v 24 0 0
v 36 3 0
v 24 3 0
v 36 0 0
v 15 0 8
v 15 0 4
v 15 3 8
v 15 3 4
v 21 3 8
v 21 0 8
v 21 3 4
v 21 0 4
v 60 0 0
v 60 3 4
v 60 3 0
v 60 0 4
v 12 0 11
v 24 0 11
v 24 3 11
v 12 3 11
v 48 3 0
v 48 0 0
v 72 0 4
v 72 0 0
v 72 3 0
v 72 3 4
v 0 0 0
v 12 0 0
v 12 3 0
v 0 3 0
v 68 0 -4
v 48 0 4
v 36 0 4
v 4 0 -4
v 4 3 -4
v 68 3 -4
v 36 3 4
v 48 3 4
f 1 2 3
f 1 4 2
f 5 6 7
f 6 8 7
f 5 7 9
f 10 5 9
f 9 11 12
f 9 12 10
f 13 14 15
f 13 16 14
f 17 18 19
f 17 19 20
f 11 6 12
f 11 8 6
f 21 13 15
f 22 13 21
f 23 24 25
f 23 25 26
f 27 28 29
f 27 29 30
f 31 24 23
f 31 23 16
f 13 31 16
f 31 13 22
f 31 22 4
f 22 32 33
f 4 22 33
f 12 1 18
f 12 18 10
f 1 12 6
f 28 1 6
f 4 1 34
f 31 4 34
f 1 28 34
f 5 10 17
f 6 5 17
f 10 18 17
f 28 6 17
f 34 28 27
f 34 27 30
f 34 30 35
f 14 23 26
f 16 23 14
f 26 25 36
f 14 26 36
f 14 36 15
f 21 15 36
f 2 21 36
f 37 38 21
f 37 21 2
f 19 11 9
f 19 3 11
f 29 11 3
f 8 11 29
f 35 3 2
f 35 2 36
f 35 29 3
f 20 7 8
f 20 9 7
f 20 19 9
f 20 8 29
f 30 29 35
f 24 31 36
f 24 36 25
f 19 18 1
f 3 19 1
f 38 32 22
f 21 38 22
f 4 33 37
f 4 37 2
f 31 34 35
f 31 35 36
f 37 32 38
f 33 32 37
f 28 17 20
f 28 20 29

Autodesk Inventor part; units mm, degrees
ref_plane "YZ Plane" through (0, 0, 0) normal (1, 0, 0) x (0, 1, 0)
ref_plane "XZ Plane" through (0, 0, 0) normal (0, 1, 0) x (-1, 0, 0)
ref_plane "XY Plane" through (0, 0, 0) normal (0, 0, 1) x (1, 0, 0)
sketch "Эскиз1" plane through (0, 0, 0) normal (0, 1, 0) x (-1, 0, 0)
  line L0 (-4, -4) -> (-68, -4)
  line L1 (-72, 0) -> (-72, 4)
  line L2 (0, 0) -> (-3.643, -3.643)
  line L3 (-3.643, -3.643) -> (-4, -4)
  line L4 (-48, 4) -> (-48, 0)
  line L5 (-48, 4) -> (-48, 0)
  line L6 (-36, 4) -> (-36, 0)
  line L7 (-60, 4) -> (-60, 0)
  line L8 (-72, 4) -> (-60, 4)
  line L9 (-48, 4) -> (-36, 4)
  line L10 (-60, 0) -> (-48, 0)
  line L11 (-36, 0) -> (-24, 0)
  line L12 (-12, 0) -> (0, 0)
  line L13 (-68, -4) -> (-72, 0)
  line L14 (-24, 11) -> (-12, 11)
  line L15 (-12, 11) -> (-12, 0)
  line L16 (-24, 11) -> (-24, 0)
  point P0 (0, 0)
  point P1 (-48, 2)
  point P2 (-72, 2)
  point P3 (-48, 2)
  point P4 (-12, 2)
  point P5 (-36, 2)
  point P6 (-60, 2)
  point P7 (-30, 0)
  point P8 (-3.8215, -3.8215)
  dimension "d9" = 24
  dimension "d13" = 12
  dimension "d19" = 4
  dimension "d23" = 8
  dimension "d26" = 135
  dimension "d28" = 72
  dimension "d29" = 12
  dimension "d30" = 11
extrude "Выдавливание1" add sketch "Эскиз1" along normal blind 3
sketch "Эскиз2" plane through (0, 3, 0) normal (0, 1, 0) x (1, 0, 0)
  line L0 (12, 0) -> (12, -11) construction
  line L1 (12, -11) -> (24, -11) construction
  line L2 (15, -4) -> (15, -8)
  line L3 (15, -8) -> (21, -8)
  line L4 (15, -4) -> (21, -4)
  line L5 (21, -4) -> (21, -8)
  line L6 (24, -11) -> (24, 0) projected
  point P0 (0, 0)
  point P1 (21, -6)
  dimension "d31" = 3
  dimension "d32" = 4
  dimension "d33" = 3
  dimension "d36" = 3
extrude "Выдавливание2" cut sketch "Эскиз2" against normal blind 10
properties part number "креп"
